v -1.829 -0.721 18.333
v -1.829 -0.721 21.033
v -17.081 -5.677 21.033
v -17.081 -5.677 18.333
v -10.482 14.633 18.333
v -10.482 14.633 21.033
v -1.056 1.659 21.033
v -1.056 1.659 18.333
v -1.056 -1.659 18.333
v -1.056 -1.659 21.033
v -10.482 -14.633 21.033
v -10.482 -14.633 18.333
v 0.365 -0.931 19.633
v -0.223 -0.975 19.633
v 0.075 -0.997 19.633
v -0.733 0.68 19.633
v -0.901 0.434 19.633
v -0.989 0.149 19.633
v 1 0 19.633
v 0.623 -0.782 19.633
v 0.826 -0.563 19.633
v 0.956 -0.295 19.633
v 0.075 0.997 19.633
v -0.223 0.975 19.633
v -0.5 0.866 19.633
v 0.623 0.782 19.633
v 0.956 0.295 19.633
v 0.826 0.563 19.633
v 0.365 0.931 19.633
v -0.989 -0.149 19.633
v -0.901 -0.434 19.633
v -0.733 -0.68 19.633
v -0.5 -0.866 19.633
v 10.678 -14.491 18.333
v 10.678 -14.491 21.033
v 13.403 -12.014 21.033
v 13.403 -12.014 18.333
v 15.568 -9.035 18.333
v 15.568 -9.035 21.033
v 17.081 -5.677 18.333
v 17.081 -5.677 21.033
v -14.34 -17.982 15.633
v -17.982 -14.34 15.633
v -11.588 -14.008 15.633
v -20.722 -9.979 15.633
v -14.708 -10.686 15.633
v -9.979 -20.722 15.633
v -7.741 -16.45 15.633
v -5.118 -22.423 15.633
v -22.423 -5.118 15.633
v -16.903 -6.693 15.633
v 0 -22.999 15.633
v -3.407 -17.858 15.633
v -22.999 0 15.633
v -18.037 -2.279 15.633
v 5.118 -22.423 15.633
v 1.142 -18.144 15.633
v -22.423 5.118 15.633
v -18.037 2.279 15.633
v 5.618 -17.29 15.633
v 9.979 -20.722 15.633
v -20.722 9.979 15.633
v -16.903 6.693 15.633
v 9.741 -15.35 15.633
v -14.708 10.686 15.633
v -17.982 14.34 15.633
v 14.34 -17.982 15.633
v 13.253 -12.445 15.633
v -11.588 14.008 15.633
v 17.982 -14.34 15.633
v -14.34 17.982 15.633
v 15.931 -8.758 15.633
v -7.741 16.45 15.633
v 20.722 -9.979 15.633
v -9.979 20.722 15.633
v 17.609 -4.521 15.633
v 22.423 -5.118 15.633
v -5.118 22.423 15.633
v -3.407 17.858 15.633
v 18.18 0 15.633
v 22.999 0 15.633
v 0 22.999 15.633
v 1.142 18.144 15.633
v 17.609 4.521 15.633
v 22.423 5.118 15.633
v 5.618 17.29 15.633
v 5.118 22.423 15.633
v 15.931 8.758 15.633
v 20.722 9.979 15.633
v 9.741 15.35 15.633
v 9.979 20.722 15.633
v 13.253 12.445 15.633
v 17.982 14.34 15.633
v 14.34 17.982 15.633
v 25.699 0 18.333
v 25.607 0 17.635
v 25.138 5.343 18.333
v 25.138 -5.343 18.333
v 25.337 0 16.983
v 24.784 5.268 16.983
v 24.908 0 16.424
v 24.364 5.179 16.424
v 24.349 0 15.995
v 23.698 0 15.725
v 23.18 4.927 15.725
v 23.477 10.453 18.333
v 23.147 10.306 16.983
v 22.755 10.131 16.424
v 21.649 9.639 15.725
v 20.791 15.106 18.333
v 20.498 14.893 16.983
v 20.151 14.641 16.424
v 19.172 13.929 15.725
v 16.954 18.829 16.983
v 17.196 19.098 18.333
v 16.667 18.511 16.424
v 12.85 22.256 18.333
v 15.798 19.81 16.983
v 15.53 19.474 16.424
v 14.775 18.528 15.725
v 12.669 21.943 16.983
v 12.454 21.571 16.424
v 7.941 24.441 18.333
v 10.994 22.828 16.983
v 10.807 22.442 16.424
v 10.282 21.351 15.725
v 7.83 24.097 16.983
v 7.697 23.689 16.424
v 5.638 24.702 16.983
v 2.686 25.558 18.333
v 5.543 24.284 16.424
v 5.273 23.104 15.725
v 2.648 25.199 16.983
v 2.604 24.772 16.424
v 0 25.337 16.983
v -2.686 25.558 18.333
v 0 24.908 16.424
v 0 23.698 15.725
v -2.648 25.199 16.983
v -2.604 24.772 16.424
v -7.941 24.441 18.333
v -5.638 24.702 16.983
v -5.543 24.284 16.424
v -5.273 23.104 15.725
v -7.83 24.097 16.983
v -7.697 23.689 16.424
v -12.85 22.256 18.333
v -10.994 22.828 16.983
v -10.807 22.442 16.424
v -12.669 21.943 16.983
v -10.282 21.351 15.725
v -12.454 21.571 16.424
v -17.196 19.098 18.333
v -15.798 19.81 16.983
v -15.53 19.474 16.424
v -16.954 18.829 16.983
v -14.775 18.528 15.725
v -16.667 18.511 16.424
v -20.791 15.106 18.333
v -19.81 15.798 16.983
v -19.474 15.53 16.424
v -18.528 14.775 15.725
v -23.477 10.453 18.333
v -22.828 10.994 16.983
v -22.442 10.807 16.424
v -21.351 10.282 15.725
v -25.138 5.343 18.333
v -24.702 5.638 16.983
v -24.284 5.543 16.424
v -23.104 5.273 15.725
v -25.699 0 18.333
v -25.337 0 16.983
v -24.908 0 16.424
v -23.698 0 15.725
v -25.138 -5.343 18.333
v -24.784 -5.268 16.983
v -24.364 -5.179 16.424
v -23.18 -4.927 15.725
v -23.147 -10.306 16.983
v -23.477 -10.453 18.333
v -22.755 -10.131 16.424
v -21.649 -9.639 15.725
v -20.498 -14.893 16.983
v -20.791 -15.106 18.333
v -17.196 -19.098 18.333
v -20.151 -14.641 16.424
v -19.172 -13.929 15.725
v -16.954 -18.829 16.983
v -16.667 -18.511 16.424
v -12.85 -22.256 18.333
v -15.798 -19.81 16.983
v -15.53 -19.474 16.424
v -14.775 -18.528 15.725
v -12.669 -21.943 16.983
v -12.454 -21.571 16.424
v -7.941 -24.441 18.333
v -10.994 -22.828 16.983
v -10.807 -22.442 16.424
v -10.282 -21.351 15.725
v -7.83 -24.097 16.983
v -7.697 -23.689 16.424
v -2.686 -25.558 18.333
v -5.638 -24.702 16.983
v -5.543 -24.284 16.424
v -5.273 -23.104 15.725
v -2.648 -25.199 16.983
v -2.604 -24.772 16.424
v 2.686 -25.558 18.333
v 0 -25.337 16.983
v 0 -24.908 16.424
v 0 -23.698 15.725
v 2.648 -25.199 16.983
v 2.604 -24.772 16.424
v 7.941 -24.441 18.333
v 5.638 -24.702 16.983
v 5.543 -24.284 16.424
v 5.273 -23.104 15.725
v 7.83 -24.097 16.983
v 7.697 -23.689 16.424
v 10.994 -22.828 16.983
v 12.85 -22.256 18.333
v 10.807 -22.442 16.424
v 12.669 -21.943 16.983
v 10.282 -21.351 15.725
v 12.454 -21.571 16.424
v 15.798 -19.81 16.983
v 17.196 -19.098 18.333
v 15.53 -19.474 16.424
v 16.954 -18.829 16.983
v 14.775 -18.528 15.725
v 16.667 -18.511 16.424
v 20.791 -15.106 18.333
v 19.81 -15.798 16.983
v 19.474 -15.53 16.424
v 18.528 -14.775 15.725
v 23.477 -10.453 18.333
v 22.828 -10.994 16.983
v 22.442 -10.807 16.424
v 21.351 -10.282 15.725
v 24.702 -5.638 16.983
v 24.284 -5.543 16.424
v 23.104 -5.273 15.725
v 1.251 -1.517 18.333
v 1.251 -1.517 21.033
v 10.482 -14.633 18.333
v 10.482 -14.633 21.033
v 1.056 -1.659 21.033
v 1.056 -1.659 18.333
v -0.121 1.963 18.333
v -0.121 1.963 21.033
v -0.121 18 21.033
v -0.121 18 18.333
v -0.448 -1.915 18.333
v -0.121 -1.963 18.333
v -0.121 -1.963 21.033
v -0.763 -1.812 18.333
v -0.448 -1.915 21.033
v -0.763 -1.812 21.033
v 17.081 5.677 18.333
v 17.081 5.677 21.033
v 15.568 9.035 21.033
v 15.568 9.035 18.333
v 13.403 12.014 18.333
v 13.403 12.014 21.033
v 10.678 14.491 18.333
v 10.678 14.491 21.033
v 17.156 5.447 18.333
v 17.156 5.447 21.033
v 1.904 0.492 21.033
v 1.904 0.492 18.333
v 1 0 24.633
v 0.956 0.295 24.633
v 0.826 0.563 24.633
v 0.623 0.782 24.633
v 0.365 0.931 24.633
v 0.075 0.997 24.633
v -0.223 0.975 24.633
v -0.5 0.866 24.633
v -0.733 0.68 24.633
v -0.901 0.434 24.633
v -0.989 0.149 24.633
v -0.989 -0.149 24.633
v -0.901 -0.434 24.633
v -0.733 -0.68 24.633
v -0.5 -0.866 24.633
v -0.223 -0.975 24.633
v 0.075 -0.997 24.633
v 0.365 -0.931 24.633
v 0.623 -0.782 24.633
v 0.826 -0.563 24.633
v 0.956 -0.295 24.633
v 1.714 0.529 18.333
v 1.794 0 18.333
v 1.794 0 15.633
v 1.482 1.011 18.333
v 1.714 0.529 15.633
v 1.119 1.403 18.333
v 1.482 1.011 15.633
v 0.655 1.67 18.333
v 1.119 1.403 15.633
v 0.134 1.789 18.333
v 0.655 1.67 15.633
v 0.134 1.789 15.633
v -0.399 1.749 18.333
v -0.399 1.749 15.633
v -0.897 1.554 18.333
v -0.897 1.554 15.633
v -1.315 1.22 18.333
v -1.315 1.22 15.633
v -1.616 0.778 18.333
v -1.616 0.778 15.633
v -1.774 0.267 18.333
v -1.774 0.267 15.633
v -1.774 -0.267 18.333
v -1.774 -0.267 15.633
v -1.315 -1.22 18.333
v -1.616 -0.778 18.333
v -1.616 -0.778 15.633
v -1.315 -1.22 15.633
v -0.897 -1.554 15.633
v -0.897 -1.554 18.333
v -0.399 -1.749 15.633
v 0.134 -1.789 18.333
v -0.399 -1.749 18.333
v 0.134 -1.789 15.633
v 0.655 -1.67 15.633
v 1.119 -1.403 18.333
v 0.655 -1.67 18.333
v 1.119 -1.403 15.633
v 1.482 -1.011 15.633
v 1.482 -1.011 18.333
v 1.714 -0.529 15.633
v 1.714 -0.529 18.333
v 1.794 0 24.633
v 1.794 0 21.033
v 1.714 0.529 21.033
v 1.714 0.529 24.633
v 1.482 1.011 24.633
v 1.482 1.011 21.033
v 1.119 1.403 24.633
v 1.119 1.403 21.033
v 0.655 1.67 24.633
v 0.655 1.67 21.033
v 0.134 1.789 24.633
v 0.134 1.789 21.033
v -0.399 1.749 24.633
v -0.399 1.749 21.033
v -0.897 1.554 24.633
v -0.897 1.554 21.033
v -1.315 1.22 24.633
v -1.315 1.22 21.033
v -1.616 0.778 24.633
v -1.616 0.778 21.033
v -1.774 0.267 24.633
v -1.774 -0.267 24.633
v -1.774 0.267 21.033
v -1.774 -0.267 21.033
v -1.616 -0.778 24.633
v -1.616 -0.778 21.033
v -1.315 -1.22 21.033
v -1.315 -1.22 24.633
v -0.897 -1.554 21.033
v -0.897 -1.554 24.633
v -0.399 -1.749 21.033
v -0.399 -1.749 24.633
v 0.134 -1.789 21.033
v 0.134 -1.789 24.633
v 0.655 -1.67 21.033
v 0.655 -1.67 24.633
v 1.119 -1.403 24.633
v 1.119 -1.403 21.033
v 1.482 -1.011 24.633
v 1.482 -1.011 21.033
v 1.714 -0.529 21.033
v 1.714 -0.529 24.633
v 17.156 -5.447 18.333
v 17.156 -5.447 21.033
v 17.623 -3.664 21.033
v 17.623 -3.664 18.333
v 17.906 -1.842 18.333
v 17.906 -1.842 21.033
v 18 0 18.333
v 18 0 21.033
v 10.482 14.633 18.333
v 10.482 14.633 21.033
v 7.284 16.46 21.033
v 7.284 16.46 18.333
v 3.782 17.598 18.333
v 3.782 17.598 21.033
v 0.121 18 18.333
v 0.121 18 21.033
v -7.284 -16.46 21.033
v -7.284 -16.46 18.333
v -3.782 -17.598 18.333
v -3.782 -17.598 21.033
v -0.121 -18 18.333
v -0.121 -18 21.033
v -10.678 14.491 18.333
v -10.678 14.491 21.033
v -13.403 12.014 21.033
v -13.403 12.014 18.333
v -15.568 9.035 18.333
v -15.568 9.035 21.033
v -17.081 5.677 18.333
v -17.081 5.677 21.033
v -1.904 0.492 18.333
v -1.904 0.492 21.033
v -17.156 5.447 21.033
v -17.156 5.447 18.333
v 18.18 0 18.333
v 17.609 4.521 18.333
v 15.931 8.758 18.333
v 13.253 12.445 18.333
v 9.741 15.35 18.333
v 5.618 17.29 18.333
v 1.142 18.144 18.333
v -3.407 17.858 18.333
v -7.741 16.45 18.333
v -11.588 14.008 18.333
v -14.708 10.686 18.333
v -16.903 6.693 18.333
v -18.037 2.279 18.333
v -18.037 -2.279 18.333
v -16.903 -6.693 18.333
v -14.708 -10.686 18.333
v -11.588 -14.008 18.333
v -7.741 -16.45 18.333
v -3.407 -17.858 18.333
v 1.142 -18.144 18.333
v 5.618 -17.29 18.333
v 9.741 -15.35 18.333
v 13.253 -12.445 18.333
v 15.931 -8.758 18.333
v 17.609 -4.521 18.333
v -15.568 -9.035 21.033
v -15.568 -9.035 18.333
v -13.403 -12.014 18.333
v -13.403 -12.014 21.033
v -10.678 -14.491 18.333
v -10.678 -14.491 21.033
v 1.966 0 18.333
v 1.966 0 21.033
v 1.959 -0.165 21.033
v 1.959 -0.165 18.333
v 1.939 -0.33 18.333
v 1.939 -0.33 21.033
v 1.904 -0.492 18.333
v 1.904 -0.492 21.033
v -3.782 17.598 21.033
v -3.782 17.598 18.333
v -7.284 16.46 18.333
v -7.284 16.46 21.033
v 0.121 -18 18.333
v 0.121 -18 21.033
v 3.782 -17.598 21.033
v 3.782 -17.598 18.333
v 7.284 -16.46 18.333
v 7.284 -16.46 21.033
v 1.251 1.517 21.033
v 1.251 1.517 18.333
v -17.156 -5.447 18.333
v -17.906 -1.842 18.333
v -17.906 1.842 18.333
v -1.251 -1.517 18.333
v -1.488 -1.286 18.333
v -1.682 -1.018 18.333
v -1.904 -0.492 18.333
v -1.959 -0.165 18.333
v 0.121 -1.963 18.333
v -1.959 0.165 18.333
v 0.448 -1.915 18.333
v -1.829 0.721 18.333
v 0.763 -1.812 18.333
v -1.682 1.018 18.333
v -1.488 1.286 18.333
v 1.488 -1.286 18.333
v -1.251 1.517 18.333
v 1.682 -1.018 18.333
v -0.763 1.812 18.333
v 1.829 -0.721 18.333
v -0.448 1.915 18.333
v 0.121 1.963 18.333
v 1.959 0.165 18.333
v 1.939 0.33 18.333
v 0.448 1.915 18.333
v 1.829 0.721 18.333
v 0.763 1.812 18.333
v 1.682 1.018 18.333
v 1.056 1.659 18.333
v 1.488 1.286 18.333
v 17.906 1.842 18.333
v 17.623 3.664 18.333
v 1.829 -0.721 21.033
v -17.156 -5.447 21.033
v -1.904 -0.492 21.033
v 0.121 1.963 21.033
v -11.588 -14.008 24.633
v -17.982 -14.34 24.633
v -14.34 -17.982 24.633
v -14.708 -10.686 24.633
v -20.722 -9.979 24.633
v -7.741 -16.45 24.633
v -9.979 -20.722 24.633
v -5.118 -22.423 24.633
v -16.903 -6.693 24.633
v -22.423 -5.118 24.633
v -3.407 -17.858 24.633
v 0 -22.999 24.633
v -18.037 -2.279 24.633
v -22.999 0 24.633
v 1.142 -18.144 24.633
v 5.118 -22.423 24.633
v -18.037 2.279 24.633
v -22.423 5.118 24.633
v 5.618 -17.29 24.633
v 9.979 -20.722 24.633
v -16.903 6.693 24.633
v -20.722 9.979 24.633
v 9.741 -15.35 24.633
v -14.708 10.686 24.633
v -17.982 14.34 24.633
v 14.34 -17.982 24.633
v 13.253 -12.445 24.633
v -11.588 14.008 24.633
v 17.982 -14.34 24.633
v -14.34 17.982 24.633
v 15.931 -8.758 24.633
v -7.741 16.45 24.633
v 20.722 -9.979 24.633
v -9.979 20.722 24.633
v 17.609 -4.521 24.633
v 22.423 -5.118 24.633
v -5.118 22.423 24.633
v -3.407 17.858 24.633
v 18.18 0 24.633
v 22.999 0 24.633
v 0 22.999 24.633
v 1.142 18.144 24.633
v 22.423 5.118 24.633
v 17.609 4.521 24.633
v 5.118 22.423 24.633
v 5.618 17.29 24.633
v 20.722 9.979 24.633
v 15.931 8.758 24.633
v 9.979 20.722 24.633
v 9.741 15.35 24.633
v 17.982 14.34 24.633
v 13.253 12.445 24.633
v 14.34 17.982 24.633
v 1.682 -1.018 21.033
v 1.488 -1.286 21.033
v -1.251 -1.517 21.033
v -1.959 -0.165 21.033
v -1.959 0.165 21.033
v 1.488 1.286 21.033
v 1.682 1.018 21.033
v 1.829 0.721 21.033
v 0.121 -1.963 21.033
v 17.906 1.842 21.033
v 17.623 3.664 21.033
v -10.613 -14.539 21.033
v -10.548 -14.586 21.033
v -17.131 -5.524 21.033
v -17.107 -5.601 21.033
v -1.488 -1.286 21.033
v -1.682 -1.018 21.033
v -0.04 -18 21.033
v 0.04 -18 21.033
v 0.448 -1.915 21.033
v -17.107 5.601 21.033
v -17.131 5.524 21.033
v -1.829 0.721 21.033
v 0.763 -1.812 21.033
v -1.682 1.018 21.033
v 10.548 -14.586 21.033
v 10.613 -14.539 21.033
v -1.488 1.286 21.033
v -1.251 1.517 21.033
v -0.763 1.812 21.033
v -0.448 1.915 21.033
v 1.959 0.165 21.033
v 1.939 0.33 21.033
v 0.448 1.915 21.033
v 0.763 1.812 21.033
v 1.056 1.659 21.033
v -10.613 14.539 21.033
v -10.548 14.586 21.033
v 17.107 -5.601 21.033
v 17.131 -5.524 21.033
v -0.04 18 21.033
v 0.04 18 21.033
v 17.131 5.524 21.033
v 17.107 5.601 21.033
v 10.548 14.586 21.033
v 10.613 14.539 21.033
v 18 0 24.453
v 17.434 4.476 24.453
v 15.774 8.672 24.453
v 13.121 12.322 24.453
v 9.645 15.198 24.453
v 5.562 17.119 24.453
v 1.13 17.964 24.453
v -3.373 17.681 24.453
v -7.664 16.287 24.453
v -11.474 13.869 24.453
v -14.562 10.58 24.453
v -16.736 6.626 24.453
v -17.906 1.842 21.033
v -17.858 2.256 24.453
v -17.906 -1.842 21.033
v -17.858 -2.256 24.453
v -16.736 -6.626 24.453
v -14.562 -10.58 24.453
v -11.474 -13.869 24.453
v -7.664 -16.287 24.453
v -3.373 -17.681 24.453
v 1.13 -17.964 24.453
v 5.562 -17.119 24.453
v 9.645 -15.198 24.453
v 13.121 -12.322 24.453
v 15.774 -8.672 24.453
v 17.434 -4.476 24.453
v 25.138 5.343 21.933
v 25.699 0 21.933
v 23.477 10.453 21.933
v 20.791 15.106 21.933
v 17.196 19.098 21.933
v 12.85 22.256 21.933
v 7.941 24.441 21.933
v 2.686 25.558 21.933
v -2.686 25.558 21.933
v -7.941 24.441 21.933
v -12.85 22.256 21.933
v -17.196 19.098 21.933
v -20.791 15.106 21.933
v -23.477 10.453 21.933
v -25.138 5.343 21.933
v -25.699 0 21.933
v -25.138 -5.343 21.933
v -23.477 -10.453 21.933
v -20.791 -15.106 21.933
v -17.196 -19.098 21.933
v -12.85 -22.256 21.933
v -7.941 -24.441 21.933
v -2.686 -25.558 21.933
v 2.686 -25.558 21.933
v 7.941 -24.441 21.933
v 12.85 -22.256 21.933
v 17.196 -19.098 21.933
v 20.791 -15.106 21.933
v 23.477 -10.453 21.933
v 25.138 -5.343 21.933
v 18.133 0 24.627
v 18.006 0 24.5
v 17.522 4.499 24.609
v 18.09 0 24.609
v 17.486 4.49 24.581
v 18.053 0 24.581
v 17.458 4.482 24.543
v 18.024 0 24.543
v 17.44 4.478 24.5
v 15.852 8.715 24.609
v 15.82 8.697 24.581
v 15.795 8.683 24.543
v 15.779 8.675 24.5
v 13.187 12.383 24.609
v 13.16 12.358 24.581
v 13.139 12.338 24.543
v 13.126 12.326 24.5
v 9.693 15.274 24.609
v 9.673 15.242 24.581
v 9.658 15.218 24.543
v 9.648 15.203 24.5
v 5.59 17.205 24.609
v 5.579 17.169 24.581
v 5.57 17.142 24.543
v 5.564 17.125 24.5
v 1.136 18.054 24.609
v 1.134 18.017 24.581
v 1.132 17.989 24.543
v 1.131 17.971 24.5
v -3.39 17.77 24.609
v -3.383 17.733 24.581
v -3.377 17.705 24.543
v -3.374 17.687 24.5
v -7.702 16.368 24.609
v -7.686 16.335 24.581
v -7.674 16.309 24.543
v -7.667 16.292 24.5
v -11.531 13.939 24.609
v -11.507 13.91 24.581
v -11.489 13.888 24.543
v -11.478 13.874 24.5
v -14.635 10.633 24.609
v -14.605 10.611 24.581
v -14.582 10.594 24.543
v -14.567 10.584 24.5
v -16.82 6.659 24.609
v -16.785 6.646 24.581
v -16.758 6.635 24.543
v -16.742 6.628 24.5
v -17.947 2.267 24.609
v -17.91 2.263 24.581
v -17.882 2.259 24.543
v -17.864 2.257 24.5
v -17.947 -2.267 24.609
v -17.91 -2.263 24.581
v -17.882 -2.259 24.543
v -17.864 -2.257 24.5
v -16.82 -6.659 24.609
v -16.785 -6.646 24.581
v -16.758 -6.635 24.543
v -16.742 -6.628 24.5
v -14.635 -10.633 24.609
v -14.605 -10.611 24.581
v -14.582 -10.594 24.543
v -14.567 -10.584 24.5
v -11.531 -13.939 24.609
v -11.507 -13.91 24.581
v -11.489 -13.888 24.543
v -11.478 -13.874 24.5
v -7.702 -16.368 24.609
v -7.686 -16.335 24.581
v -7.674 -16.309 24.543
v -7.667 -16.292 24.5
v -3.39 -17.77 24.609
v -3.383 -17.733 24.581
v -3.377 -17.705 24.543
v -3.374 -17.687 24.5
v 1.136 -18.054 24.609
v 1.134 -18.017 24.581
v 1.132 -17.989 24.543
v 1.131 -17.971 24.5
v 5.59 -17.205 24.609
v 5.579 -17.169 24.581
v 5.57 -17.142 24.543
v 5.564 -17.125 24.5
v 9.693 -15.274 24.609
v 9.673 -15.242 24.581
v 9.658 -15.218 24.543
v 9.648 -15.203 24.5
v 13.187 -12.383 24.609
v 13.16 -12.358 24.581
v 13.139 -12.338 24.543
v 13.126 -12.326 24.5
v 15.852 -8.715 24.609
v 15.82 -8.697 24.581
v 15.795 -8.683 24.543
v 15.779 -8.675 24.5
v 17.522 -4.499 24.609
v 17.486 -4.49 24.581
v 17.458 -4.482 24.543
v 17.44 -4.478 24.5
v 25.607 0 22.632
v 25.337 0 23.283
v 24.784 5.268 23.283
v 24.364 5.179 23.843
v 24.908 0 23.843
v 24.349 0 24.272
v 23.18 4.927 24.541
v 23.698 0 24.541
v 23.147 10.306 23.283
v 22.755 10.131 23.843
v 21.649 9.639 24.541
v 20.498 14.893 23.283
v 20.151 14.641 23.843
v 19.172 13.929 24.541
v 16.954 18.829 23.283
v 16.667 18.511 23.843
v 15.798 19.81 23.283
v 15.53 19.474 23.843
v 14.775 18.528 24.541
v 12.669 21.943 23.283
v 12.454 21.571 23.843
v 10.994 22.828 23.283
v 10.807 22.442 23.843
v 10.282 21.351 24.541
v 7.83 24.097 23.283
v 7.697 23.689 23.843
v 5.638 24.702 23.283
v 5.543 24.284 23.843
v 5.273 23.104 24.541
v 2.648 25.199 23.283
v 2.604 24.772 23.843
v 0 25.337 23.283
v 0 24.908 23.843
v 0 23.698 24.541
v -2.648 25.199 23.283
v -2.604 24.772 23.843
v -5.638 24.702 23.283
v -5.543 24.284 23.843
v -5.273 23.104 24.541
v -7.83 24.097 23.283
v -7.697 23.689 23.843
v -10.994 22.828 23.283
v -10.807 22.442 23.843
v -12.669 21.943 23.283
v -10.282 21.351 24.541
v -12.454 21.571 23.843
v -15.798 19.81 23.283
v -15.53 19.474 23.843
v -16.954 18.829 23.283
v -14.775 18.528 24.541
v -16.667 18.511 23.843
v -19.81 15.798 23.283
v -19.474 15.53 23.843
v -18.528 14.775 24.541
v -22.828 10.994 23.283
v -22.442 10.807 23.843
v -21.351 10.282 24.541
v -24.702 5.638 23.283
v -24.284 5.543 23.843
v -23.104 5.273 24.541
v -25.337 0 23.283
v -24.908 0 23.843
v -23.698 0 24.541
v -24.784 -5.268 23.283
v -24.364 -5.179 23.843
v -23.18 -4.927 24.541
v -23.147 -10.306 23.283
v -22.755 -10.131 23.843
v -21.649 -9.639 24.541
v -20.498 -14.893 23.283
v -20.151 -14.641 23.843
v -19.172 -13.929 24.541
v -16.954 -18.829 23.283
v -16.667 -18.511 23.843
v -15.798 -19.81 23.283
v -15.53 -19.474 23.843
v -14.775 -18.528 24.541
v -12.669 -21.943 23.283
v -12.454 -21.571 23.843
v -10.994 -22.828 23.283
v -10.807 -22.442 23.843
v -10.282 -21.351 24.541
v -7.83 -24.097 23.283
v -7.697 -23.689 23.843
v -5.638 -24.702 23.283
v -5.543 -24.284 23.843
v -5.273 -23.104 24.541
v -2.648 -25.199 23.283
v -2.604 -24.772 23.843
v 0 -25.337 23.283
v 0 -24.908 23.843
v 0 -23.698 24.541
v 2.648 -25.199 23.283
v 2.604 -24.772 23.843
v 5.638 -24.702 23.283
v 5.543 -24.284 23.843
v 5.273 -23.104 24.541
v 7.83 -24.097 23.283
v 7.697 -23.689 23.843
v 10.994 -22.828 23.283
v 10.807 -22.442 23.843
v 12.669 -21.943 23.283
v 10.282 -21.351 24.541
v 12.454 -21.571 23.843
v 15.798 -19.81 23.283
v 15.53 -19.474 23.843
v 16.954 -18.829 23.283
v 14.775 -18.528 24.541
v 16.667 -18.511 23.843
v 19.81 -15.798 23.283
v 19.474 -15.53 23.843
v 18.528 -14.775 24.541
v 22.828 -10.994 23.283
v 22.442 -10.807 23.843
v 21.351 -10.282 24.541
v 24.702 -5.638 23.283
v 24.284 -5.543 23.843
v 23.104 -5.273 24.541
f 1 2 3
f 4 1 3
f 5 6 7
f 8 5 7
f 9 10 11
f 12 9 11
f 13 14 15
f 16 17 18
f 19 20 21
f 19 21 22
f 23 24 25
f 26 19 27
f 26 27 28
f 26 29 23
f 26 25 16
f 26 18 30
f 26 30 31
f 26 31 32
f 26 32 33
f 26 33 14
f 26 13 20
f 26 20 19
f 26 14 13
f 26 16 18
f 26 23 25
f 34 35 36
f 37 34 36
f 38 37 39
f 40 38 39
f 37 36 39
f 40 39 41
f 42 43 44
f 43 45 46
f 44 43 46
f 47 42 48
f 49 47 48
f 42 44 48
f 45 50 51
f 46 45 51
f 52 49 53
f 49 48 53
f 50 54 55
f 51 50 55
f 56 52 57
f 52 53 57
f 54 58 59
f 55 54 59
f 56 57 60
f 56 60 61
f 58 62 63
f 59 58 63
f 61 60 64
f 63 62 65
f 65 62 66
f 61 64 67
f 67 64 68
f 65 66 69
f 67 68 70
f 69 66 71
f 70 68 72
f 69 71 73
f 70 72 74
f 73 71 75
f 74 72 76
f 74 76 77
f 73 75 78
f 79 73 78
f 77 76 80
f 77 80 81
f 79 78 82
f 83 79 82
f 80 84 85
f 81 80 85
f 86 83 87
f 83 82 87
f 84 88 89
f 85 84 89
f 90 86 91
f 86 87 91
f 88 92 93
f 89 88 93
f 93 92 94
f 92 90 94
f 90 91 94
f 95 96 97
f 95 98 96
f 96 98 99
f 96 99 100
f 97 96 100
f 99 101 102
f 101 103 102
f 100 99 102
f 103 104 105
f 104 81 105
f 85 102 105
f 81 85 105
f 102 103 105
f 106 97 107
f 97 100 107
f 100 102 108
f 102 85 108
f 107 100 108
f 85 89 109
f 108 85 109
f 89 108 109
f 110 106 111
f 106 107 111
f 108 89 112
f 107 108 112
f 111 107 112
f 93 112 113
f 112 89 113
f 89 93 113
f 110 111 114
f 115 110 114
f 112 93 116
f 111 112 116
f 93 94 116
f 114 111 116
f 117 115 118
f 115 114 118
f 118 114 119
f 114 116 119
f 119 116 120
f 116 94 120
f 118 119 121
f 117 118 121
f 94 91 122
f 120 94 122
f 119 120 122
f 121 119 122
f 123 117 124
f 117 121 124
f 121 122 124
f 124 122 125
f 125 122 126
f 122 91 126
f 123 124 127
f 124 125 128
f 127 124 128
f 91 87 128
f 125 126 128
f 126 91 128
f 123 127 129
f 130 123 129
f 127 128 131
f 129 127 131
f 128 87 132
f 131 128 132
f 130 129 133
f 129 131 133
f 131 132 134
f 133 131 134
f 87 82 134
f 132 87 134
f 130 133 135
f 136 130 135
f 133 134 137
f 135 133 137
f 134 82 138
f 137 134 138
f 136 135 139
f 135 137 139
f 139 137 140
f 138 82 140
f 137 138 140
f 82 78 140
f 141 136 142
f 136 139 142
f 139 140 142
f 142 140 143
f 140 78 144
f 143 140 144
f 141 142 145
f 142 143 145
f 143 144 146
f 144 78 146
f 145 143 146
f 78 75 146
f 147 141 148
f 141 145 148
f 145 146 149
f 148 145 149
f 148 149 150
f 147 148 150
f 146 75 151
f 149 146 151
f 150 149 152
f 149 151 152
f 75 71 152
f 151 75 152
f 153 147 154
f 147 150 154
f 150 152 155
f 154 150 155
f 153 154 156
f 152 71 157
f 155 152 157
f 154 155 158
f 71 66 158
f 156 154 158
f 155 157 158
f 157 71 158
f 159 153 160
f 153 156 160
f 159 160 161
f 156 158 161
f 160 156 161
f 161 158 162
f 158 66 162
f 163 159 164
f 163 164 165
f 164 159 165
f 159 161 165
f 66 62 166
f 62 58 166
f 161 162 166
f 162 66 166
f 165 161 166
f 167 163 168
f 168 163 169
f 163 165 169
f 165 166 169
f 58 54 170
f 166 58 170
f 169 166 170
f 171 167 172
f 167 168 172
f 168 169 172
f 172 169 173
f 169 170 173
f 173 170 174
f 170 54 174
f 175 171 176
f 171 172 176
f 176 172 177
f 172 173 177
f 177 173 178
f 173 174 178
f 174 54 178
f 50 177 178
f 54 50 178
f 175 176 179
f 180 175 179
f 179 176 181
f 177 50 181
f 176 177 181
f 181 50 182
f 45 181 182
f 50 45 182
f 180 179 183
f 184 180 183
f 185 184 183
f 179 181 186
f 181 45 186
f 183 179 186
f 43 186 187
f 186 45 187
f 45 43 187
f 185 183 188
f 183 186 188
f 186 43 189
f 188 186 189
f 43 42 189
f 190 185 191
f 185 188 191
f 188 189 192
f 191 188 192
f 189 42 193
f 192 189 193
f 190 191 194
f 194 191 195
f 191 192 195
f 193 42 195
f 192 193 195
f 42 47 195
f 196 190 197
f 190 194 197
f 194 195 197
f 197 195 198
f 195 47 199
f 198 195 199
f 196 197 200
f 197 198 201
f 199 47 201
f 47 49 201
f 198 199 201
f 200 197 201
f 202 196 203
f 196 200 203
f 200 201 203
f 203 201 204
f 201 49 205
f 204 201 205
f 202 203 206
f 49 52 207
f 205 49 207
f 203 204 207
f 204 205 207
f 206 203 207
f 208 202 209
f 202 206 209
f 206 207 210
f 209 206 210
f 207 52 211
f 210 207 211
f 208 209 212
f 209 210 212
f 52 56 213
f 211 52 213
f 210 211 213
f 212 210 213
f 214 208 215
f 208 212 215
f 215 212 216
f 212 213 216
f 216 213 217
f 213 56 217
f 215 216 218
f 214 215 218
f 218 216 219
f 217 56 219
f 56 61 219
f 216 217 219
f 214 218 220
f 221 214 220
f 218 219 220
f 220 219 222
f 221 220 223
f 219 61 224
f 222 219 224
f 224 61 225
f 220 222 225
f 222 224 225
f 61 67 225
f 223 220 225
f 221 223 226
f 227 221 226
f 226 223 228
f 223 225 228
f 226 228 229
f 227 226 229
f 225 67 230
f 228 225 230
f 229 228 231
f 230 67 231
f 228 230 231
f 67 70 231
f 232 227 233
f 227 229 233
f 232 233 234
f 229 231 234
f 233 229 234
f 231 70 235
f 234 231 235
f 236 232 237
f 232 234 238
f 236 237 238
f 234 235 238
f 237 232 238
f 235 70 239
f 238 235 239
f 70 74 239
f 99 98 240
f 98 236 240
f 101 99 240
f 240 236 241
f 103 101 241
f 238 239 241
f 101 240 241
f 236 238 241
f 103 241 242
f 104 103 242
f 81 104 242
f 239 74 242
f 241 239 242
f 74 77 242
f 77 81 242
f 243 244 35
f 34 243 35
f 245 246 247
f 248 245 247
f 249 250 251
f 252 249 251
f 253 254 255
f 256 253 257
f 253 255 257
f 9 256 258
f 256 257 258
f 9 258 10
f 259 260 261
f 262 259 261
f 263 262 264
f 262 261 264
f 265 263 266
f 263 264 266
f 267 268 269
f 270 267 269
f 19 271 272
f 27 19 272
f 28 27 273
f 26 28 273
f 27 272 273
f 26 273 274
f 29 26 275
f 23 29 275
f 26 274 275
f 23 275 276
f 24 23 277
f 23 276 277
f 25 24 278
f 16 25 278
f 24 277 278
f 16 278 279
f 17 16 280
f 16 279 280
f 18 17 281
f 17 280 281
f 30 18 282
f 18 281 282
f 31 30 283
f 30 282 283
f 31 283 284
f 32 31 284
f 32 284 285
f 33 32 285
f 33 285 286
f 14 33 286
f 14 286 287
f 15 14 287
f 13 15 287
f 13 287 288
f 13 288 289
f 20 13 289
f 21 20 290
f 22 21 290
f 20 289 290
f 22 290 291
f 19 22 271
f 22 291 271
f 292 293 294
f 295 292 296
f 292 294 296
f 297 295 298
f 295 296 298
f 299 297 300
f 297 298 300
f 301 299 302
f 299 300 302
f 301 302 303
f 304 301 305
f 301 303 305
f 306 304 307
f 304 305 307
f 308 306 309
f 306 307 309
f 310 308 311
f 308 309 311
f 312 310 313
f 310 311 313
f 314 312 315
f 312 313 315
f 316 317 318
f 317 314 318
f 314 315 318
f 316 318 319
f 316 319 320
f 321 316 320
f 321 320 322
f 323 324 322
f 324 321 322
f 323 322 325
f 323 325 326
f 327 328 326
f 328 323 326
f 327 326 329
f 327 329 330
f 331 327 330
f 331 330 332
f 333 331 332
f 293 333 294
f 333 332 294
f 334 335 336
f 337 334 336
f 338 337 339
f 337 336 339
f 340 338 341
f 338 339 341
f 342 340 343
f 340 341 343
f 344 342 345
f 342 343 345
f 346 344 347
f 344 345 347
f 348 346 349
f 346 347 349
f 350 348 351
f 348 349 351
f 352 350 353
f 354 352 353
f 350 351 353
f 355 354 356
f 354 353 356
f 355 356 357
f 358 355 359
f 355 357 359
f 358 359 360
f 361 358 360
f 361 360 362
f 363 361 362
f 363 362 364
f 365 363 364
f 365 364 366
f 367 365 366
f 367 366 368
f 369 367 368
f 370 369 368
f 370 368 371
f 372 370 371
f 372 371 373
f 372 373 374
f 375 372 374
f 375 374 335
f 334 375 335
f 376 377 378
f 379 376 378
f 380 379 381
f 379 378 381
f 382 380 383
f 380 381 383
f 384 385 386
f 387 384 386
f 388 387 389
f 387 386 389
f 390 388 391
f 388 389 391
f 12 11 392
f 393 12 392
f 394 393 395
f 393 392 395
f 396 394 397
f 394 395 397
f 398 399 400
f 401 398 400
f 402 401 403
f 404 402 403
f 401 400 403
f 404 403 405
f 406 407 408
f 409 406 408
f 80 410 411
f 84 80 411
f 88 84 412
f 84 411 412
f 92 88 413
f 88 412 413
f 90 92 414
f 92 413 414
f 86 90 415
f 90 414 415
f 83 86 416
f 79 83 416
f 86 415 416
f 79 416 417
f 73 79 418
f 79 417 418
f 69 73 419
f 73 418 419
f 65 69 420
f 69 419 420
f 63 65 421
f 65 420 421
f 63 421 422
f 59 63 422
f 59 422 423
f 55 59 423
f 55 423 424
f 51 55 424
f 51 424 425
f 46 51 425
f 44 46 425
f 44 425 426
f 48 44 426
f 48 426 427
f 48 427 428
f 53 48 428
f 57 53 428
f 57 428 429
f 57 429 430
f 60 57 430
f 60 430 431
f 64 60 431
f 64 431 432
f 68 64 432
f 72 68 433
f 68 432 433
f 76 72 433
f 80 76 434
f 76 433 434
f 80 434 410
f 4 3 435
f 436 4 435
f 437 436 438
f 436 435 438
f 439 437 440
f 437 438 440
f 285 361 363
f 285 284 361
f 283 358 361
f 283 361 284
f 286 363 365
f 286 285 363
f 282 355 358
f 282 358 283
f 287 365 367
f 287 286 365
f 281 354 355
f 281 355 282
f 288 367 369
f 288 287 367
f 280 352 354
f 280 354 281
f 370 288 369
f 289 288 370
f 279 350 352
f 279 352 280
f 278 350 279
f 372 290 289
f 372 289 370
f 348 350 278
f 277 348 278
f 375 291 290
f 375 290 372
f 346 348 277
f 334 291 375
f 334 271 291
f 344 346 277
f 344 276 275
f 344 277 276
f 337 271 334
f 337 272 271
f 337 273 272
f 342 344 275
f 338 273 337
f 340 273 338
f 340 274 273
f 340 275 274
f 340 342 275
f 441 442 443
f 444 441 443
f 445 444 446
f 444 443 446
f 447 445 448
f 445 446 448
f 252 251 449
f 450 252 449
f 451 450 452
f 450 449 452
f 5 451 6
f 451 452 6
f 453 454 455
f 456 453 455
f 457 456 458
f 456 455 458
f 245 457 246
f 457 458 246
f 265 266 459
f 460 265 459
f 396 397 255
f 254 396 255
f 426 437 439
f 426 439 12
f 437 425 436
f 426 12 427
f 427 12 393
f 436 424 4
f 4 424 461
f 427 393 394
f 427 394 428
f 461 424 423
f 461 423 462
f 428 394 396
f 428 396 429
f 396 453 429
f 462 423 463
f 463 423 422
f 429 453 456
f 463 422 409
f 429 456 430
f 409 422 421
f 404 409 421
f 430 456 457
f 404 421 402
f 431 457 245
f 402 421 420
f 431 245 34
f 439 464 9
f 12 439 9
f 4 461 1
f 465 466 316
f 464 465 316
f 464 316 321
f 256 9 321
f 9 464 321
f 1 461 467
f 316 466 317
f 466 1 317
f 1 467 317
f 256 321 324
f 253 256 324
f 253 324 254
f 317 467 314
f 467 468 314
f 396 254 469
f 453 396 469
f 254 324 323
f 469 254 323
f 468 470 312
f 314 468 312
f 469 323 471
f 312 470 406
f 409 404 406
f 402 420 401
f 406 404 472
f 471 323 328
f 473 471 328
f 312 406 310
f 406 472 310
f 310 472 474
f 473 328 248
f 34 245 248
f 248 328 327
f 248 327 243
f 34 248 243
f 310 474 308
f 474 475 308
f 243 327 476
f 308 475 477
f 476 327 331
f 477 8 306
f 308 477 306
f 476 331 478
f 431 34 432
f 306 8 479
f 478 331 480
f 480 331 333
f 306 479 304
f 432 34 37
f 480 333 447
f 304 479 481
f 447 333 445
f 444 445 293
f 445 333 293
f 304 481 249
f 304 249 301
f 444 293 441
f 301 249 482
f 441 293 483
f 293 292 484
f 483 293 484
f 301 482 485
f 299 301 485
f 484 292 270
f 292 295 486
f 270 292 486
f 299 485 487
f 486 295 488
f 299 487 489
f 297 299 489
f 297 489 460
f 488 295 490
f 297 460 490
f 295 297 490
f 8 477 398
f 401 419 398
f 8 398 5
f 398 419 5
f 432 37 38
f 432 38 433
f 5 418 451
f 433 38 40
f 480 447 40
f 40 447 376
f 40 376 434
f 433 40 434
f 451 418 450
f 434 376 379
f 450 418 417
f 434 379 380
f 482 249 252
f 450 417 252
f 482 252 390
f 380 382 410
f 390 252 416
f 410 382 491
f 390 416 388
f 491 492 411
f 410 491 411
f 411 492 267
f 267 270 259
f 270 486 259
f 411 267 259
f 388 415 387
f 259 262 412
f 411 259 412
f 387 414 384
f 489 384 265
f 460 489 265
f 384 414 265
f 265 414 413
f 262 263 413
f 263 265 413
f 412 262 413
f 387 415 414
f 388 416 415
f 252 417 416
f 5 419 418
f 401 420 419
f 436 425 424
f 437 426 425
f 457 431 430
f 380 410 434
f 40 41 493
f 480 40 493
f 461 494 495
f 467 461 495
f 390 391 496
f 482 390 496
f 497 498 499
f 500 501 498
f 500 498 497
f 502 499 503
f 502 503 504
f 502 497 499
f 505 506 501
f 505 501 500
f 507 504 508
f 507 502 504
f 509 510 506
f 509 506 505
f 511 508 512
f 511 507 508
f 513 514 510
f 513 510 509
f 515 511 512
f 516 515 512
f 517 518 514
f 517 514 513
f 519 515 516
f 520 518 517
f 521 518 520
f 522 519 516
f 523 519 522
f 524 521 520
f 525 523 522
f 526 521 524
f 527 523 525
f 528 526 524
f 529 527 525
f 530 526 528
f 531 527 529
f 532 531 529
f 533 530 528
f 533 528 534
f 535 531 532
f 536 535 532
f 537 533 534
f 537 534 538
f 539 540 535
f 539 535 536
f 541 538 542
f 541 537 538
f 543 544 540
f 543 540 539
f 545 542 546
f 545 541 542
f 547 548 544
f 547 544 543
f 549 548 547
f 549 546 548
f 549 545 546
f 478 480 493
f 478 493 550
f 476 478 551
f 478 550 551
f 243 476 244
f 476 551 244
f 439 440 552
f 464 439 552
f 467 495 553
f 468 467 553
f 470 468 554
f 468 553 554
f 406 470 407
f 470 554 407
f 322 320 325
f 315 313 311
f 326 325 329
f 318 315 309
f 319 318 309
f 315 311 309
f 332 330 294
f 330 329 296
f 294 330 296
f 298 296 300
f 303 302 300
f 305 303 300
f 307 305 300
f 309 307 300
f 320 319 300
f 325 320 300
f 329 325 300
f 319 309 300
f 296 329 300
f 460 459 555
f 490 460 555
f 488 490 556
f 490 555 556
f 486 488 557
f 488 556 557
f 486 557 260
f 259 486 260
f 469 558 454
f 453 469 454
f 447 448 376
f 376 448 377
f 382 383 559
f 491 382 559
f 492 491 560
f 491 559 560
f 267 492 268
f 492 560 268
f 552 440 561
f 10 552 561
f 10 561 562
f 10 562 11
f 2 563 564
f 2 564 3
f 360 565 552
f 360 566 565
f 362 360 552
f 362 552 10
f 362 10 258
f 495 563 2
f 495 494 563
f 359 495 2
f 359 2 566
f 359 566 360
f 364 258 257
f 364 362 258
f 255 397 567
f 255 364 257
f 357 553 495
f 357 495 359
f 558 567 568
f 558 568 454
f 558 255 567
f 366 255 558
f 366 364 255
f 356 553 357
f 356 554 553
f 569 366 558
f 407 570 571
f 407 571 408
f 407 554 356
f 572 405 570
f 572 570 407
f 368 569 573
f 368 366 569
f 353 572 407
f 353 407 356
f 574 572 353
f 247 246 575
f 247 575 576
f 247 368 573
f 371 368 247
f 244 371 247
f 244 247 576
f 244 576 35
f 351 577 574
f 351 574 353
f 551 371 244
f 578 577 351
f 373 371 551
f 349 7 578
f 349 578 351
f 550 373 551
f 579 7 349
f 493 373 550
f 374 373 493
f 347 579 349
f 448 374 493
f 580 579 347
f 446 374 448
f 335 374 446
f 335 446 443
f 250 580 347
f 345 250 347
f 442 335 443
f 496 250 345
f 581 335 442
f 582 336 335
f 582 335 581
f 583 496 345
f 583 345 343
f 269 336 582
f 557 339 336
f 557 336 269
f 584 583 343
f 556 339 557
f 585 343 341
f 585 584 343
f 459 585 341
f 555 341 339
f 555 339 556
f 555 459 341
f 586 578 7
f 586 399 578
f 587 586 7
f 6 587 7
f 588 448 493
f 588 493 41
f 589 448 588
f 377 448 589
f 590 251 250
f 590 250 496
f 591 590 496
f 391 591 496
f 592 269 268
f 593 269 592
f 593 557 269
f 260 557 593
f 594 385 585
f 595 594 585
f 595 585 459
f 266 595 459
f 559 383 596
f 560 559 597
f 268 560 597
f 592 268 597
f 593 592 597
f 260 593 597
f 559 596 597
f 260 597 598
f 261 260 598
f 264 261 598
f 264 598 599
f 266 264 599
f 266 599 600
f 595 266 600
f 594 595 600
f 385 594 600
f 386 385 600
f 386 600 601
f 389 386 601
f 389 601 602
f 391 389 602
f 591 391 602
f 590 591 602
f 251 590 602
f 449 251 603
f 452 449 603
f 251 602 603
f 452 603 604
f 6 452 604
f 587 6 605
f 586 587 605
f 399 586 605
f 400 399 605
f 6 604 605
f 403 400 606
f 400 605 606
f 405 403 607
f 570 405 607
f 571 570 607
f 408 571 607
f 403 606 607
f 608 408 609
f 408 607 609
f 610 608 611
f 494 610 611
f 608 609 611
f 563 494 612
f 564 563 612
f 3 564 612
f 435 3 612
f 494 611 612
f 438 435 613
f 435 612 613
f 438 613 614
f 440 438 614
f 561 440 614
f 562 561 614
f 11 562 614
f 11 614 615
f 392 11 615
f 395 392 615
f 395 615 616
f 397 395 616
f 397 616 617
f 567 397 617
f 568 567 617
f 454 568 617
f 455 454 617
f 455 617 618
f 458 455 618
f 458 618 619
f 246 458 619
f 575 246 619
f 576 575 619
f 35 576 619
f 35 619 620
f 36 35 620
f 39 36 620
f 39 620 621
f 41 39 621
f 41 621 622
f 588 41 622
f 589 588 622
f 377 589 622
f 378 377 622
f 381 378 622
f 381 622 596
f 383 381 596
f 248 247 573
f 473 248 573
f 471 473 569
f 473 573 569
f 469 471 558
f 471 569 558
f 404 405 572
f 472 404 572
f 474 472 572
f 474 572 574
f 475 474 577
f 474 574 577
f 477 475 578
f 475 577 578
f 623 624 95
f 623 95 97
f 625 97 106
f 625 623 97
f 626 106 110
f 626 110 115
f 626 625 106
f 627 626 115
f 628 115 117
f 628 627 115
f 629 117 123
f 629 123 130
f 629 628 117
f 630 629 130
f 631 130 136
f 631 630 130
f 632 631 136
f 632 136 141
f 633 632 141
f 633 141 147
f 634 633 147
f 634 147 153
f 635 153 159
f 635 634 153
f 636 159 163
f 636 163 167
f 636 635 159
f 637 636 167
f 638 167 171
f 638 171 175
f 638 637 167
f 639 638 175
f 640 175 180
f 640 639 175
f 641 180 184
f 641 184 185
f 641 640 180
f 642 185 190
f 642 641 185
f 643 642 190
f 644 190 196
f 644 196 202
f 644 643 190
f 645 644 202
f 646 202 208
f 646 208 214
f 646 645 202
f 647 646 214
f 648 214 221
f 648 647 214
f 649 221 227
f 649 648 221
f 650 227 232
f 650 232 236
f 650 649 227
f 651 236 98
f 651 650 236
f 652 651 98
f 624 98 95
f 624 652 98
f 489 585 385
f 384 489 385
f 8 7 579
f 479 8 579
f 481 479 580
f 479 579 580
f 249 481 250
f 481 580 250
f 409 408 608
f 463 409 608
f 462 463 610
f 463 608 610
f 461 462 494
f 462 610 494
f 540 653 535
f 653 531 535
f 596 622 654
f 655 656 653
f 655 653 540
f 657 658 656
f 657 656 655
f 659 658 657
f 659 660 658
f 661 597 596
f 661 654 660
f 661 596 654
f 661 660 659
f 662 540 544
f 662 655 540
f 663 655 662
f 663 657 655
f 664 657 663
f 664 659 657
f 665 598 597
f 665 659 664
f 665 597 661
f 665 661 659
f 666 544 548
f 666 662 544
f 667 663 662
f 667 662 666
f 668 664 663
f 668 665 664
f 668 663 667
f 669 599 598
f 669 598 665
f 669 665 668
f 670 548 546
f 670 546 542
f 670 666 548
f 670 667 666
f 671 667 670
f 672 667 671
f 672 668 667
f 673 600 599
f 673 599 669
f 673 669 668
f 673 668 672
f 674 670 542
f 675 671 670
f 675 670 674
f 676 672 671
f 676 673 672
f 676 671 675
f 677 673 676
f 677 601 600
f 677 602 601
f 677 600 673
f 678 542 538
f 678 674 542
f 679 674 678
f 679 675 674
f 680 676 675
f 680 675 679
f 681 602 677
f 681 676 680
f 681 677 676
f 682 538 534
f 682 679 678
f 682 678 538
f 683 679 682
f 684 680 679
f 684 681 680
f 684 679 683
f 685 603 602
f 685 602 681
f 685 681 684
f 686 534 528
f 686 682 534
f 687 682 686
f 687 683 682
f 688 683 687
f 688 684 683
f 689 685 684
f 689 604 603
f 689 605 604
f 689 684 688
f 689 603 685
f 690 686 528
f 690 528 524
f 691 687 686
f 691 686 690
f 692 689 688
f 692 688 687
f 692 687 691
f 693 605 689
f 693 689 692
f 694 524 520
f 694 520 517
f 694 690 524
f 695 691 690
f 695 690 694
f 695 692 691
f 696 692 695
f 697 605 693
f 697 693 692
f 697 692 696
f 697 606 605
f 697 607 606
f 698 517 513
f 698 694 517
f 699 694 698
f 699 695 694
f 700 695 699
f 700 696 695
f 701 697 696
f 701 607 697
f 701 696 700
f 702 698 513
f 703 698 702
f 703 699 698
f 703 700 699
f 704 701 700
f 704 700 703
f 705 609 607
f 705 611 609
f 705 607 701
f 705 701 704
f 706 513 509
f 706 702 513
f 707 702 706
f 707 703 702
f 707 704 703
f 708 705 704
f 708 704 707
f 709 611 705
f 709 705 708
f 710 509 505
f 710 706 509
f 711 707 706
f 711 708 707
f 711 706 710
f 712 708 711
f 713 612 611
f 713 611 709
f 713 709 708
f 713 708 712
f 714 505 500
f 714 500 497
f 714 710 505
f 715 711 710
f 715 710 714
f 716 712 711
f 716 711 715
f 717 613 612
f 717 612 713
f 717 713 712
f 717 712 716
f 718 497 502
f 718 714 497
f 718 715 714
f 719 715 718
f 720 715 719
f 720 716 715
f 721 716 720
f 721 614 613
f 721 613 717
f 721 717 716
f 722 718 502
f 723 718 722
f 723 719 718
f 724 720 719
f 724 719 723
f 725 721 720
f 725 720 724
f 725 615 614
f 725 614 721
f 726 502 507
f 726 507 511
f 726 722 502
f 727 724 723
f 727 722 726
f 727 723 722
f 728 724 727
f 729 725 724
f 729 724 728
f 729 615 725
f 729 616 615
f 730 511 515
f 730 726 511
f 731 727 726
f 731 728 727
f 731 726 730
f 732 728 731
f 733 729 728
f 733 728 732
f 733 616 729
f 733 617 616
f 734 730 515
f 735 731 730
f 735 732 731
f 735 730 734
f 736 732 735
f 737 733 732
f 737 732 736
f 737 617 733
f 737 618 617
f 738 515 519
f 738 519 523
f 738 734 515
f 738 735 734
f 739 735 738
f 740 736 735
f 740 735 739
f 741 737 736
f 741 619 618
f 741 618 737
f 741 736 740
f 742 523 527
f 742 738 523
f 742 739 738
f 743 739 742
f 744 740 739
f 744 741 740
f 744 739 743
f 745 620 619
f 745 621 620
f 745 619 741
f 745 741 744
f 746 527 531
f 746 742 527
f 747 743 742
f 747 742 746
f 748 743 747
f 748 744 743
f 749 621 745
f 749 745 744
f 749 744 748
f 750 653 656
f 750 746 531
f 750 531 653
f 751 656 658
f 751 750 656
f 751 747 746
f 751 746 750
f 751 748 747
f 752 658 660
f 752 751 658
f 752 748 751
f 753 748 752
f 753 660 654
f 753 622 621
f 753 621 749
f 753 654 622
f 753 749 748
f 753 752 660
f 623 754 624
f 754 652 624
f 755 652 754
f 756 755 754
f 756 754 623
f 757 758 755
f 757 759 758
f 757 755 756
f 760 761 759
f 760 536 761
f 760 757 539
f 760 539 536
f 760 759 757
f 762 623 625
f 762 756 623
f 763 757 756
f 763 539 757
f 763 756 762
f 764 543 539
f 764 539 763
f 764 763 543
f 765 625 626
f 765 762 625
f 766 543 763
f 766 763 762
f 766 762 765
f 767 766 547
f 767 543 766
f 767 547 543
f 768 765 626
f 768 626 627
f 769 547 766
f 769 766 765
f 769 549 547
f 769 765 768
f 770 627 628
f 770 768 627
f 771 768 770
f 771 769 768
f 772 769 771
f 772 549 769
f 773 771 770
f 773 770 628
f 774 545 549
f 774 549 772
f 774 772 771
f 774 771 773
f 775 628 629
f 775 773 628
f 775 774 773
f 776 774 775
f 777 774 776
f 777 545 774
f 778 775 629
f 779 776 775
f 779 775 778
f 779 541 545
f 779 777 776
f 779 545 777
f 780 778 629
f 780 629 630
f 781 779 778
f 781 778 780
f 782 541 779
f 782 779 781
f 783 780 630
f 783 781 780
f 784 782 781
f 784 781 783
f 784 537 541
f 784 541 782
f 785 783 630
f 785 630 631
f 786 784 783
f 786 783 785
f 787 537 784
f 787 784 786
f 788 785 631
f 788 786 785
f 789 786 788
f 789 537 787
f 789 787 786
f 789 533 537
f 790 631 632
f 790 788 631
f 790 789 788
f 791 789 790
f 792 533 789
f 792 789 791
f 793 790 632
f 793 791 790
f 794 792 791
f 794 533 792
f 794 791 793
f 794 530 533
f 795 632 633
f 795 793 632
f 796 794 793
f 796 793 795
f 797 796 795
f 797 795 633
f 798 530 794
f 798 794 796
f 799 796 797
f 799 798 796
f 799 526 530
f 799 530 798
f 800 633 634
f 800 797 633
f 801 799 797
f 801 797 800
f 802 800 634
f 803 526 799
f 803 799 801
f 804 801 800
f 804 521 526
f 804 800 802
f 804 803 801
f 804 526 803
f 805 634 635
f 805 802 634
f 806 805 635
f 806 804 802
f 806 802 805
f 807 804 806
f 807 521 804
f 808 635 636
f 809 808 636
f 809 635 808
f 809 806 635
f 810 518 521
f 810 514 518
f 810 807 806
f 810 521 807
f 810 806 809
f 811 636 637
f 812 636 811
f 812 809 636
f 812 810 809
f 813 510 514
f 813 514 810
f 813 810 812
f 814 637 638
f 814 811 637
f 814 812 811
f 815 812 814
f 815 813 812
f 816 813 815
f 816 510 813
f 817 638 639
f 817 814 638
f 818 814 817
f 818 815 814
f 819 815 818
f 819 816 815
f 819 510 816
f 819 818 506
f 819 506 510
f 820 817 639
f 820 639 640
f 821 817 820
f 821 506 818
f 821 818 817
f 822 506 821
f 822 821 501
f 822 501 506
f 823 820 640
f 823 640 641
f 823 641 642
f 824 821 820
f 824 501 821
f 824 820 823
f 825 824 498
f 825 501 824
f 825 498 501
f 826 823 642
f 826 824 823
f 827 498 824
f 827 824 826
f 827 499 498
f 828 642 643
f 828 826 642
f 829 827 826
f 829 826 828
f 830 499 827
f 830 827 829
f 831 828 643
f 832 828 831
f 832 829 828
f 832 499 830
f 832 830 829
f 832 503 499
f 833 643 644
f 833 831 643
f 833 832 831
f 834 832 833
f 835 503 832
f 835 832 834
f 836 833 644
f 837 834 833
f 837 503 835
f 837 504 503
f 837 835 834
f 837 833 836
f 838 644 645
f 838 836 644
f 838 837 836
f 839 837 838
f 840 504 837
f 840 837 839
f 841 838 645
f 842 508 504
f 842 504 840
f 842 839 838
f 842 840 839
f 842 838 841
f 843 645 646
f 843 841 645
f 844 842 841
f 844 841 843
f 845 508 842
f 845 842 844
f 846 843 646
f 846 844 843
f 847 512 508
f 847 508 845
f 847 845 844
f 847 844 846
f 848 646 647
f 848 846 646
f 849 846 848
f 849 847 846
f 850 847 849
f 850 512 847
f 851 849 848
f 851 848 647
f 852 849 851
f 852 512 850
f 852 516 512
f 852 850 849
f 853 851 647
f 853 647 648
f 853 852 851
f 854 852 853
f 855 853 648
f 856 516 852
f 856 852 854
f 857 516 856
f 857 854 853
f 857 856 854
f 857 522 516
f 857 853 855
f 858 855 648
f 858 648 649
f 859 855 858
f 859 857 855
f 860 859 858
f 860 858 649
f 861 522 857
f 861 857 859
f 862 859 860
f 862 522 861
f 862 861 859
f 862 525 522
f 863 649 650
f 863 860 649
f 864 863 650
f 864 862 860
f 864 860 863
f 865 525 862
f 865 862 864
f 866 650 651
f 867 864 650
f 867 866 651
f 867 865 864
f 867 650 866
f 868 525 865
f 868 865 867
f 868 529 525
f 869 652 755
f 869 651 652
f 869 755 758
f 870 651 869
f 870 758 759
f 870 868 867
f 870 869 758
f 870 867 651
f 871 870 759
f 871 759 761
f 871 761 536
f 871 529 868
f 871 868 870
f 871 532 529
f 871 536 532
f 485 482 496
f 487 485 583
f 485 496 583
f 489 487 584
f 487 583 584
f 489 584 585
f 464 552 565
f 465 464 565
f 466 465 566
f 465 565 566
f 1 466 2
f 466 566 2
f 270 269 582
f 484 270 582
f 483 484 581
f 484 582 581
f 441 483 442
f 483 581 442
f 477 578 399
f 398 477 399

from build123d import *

# Parameters (mm, degrees)
CROQUIS1_R                   = 275
SALIENTE_EXTRUIR1_DEPTH      = 70
CROQUIS2_R                   = 200
CORTAR_EXTRUIR1_DEPTH        = 40
CROQUIS5_R                   = 10
CORTAR_EXTRUIR2_DEPTH        = 10
REDONDEO1_R                  = 2
CORTAR_EXTRUIR_L_MINA2_DEPTH = 396.15819617
MATRIZC1_COUNT               = 24
CORTAR_EXTRUIR3_DEPTH        = 150
SALIENTE_EXTRUIR2_DEPTH      = 50
SALIENTE_EXTRUIR2_DEPTH_BACK = 50
CROQUIS12_R                  = 19.934957438
CROQUIS14_R                  = 285.546784005
CROQUIS14_R_2                = 202
SALIENTE_EXTRUIR3_DEPTH      = 100
REDONDEO2_R                  = 30
REDONDEO3_R                  = 30
SCALE1_SCALE                 = 0.5
SCALE2_SCALE                 = 0.1
SCALE3_SCALE                 = 0.2
SCALE4_SCALE                 = 0.3
SCALE5_SCALE                 = 20
SCALE6_SCALE                 = 1.5
SKETCH1_R                    = 1
CUT_EXTRUDE1_DEPTH           = 5


with BuildPart() as part:
    # Croquis1 → Saliente-Extruir1 (new body)
    with BuildSketch(Plane.XY):
        Circle(CROQUIS1_R)
    extrude(amount=SALIENTE_EXTRUIR1_DEPTH)

    # Croquis2 → Cortar-Extruir1 (cut)
    with BuildSketch(Plane.XY.offset(70)):
        Circle(CROQUIS2_R)
    extrude(amount=-CORTAR_EXTRUIR1_DEPTH, mode=Mode.SUBTRACT)

    # Croquis5 → Cortar-Extruir2 (cut)
    with BuildSketch(Plane.XY.offset(30)):
        Circle(CROQUIS5_R)
    extrude(amount=-CORTAR_EXTRUIR2_DEPTH, mode=Mode.SUBTRACT)

    # Redondeo1
    redondeo1_edges = [part.edges().sort_by_distance(p)[0] for p in [
        (-200, 0, 70),
    ]]
    fillet(redondeo1_edges, radius=REDONDEO1_R)

    # Croquis6 → Cortar-Extruir-Lámina2 (cut, through all)
    with BuildSketch(Plane.XY.offset(70)):
        Polygon((-99.341458201, 256.429863086), (-89.226691548, 230.320640663), (-89.319938771, 230.284516496), (-99.434705424, 256.39373892), align=None)
    cortar_extruir_l_mina2 = extrude(amount=-CORTAR_EXTRUIR_L_MINA2_DEPTH, mode=Mode.SUBTRACT)

    # MatrizC1: Cortar-Extruir-Lámina2 ×24 about axis
    matrizc1_axis = Axis((0, 0, 0), (0, 0, 1))
    for i in range(1, MATRIZC1_COUNT):
        add(cortar_extruir_l_mina2.rotate(matrizc1_axis, i * 360 / MATRIZC1_COUNT), mode=Mode.SUBTRACT)

    # Croquis11 → Cortar-Extruir3 (cut)
    with BuildSketch(Plane.XY.offset(30)):
        with BuildLine():
            Line((-13.902980207, 16.854693372), (-118.639144382, 161.011656163))
            ThreePointArc((-118.639144382, 161.011656163), (-161.803398875, 117.557050458), (-189.792696605, 63.077193306))
            Line((-189.792696605, 63.077193306), (-20.326023118, 8.014133235))
            ThreePointArc((-20.326023118, 8.014133235), (-17.676115044, 12.842449309), (-13.902980207, 16.854693372))
        make_face()
        with BuildLine():
            Line((-1.340807064, 21.807700102), (-1.340807064, 199.995505541))
            ThreePointArc((-1.340807064, 199.995505541), (-61.803398875, 190.211303259), (-116.469672981, 162.587869399))
            Line((-116.469672981, 162.587869399), (-11.733508805, 18.430906609))
            ThreePointArc((-11.733508805, 18.430906609), (-6.751675158, 20.779519481), (-1.340807064, 21.807700102))
        make_face()
        with BuildLine():
            Line((11.733508805, 18.430906609), (116.469672981, 162.587869399))
            ThreePointArc((116.469672981, 162.587869399), (61.803398875, 190.211303259), (1.340807064, 199.995505541))
            Line((1.340807064, 199.995505541), (1.340807064, 21.807700102))
            ThreePointArc((1.340807064, 21.807700102), (6.751675158, 20.779519481), (11.733508805, 18.430906609))
        make_face()
        with BuildLine():
            Line((20.326023118, 8.014133235), (189.792696605, 63.077193306))
            ThreePointArc((189.792696605, 63.077193306), (161.803398875, 117.557050458), (118.639144382, 161.011656163))
            Line((118.639144382, 161.011656163), (13.902980207, 16.854693372))
            ThreePointArc((13.902980207, 16.854693372), (17.676115044, 12.842449309), (20.326023118, 8.014133235))
        make_face()
        with BuildLine():
            ThreePointArc((200, 0), (197.641433142, 30.624563763), (190.621360943, 60.526826715))
            Line((190.621360943, 60.526826715), (21.154687456, 5.463766645))
            ThreePointArc((21.154687456, 5.463766645), (21.674636908, 2.75384499), (21.848879772, 0))
            ThreePointArc((21.848879772, 0), (21.674636908, -2.75384499), (21.154687456, -5.463766645))
            Line((21.154687456, -5.463766644), (190.621360943, -60.526826715))
            ThreePointArc((190.621360943, -60.526826715), (197.641433142, -30.624563763), (200, 0))
        make_face()
        with BuildLine():
            ThreePointArc((118.639144382, -161.011656163), (161.803398875, -117.557050458), (189.792696605, -63.077193306))
            Line((189.792696605, -63.077193306), (20.326023118, -8.014133235))
            ThreePointArc((20.326023118, -8.014133235), (17.676115044, -12.842449309), (13.902980207, -16.854693372))
            Line((13.902980207, -16.854693372), (118.639144382, -161.011656163))
        make_face()
        with BuildLine():
            Line((-21.154687456, 5.463766645), (-190.621360943, 60.526826715))
            ThreePointArc((-190.621360943, 60.526826715), (-200, 0), (-190.621360943, -60.526826715))
            Line((-190.621360943, -60.526826715), (-21.154687456, -5.463766644))
            ThreePointArc((-21.154687456, -5.463766644), (-21.848879772, 0), (-21.154687456, 5.463766645))
        make_face()
        with BuildLine():
            ThreePointArc((-189.792696605, -63.077193306), (-161.803398875, -117.557050458), (-118.639144382, -161.011656163))
            Line((-118.639144382, -161.011656163), (-13.902980207, -16.854693372))
            ThreePointArc((-13.902980207, -16.854693372), (-17.676115044, -12.842449309), (-20.326023118, -8.014133235))
            Line((-20.326023118, -8.014133235), (-189.792696605, -63.077193306))
        make_face()
        with BuildLine():
            ThreePointArc((-116.469672981, -162.587869399), (-61.803398875, -190.211303259), (-1.340807064, -199.995505541))
            Line((-1.340807064, -199.995505541), (-1.340807064, -21.807700102))
            ThreePointArc((-1.340807064, -21.807700102), (-6.751675158, -20.779519481), (-11.733508805, -18.430906609))
            Line((-11.733508805, -18.430906609), (-116.469672981, -162.587869399))
        make_face()
        with BuildLine():
            ThreePointArc((1.340807064, -199.995505541), (61.803398875, -190.211303259), (116.469672981, -162.587869399))
            Line((116.469672981, -162.587869399), (11.733508805, -18.430906609))
            ThreePointArc((11.733508805, -18.430906609), (6.751675158, -20.779519481), (1.340807064, -21.807700102))
            Line((1.340807064, -21.807700102), (1.340807064, -199.995505541))
        make_face()
    extrude(amount=-CORTAR_EXTRUIR3_DEPTH, mode=Mode.SUBTRACT)

    # Croquis12 → Saliente-Extruir2 (add, two sides: drawn at the far end of the back side and taken through both)
    with BuildSketch(Plane.XY.offset(20).offset(-SALIENTE_EXTRUIR2_DEPTH_BACK)):
        Circle(CROQUIS12_R)
    extrude(amount=SALIENTE_EXTRUIR2_DEPTH + SALIENTE_EXTRUIR2_DEPTH_BACK)

    # Croquis14 → Saliente-Extruir3 (add)
    with BuildSketch(Plane.XY.offset(70)):
        Circle(CROQUIS14_R)
        Circle(CROQUIS14_R_2, mode=Mode.SUBTRACT)
    extrude(amount=-SALIENTE_EXTRUIR3_DEPTH)

    # Redondeo2
    redondeo2_edges = [part.edges().sort_by_distance(p)[0] for p in [
        (-285.546784005, 0, 70),
    ]]
    fillet(redondeo2_edges, radius=REDONDEO2_R)

    # Redondeo3
    redondeo3_edges = [part.edges().sort_by_distance(p)[0] for p in [
        (-285.546784005, 0, -30),
    ]]
    fillet(redondeo3_edges, radius=REDONDEO3_R)


with BuildPart() as part_1:
    # Scale1: scaled about (0, 0, 20.146701312)
    add(part.part.scale(SCALE1_SCALE).moved(Location((0, 0, 10.073350656))))


with BuildPart() as part_2:
    # Scale2: scaled about (0, 0, 20.146701312)
    add(part_1.part.scale(SCALE2_SCALE).moved(Location((0, 0, 18.132031181))))


with BuildPart() as part_3:
    # Scale3: scaled about (0, 0, 20.146701312)
    add(part_2.part.scale(SCALE3_SCALE).moved(Location((0, 0, 16.11736105))))


with BuildPart() as part_4:
    # Scale4: scaled about (0, 0, 20.146701312)
    add(part_3.part.scale(SCALE4_SCALE).moved(Location((0, 0, 14.102690918))))


with BuildPart() as part_5:
    # Scale5: scaled about (0, 0, 20.146701312)
    add(part_4.part.scale(SCALE5_SCALE).moved(Location((0, 0, -382.787324928))))


with BuildPart() as part_6:
    # Scale6: scaled about (0, 0, 20.146701312)
    add(part_5.part.scale(SCALE6_SCALE).moved(Location((0, 0, -10.073350656))))

    # Sketch1 → Cut-Extrude1 (cut)
    with BuildSketch(Plane.XY.offset(24.633498194)):
        Circle(SKETCH1_R)
    extrude(amount=-CUT_EXTRUDE1_DEPTH, mode=Mode.SUBTRACT)


solid = part_6.part
